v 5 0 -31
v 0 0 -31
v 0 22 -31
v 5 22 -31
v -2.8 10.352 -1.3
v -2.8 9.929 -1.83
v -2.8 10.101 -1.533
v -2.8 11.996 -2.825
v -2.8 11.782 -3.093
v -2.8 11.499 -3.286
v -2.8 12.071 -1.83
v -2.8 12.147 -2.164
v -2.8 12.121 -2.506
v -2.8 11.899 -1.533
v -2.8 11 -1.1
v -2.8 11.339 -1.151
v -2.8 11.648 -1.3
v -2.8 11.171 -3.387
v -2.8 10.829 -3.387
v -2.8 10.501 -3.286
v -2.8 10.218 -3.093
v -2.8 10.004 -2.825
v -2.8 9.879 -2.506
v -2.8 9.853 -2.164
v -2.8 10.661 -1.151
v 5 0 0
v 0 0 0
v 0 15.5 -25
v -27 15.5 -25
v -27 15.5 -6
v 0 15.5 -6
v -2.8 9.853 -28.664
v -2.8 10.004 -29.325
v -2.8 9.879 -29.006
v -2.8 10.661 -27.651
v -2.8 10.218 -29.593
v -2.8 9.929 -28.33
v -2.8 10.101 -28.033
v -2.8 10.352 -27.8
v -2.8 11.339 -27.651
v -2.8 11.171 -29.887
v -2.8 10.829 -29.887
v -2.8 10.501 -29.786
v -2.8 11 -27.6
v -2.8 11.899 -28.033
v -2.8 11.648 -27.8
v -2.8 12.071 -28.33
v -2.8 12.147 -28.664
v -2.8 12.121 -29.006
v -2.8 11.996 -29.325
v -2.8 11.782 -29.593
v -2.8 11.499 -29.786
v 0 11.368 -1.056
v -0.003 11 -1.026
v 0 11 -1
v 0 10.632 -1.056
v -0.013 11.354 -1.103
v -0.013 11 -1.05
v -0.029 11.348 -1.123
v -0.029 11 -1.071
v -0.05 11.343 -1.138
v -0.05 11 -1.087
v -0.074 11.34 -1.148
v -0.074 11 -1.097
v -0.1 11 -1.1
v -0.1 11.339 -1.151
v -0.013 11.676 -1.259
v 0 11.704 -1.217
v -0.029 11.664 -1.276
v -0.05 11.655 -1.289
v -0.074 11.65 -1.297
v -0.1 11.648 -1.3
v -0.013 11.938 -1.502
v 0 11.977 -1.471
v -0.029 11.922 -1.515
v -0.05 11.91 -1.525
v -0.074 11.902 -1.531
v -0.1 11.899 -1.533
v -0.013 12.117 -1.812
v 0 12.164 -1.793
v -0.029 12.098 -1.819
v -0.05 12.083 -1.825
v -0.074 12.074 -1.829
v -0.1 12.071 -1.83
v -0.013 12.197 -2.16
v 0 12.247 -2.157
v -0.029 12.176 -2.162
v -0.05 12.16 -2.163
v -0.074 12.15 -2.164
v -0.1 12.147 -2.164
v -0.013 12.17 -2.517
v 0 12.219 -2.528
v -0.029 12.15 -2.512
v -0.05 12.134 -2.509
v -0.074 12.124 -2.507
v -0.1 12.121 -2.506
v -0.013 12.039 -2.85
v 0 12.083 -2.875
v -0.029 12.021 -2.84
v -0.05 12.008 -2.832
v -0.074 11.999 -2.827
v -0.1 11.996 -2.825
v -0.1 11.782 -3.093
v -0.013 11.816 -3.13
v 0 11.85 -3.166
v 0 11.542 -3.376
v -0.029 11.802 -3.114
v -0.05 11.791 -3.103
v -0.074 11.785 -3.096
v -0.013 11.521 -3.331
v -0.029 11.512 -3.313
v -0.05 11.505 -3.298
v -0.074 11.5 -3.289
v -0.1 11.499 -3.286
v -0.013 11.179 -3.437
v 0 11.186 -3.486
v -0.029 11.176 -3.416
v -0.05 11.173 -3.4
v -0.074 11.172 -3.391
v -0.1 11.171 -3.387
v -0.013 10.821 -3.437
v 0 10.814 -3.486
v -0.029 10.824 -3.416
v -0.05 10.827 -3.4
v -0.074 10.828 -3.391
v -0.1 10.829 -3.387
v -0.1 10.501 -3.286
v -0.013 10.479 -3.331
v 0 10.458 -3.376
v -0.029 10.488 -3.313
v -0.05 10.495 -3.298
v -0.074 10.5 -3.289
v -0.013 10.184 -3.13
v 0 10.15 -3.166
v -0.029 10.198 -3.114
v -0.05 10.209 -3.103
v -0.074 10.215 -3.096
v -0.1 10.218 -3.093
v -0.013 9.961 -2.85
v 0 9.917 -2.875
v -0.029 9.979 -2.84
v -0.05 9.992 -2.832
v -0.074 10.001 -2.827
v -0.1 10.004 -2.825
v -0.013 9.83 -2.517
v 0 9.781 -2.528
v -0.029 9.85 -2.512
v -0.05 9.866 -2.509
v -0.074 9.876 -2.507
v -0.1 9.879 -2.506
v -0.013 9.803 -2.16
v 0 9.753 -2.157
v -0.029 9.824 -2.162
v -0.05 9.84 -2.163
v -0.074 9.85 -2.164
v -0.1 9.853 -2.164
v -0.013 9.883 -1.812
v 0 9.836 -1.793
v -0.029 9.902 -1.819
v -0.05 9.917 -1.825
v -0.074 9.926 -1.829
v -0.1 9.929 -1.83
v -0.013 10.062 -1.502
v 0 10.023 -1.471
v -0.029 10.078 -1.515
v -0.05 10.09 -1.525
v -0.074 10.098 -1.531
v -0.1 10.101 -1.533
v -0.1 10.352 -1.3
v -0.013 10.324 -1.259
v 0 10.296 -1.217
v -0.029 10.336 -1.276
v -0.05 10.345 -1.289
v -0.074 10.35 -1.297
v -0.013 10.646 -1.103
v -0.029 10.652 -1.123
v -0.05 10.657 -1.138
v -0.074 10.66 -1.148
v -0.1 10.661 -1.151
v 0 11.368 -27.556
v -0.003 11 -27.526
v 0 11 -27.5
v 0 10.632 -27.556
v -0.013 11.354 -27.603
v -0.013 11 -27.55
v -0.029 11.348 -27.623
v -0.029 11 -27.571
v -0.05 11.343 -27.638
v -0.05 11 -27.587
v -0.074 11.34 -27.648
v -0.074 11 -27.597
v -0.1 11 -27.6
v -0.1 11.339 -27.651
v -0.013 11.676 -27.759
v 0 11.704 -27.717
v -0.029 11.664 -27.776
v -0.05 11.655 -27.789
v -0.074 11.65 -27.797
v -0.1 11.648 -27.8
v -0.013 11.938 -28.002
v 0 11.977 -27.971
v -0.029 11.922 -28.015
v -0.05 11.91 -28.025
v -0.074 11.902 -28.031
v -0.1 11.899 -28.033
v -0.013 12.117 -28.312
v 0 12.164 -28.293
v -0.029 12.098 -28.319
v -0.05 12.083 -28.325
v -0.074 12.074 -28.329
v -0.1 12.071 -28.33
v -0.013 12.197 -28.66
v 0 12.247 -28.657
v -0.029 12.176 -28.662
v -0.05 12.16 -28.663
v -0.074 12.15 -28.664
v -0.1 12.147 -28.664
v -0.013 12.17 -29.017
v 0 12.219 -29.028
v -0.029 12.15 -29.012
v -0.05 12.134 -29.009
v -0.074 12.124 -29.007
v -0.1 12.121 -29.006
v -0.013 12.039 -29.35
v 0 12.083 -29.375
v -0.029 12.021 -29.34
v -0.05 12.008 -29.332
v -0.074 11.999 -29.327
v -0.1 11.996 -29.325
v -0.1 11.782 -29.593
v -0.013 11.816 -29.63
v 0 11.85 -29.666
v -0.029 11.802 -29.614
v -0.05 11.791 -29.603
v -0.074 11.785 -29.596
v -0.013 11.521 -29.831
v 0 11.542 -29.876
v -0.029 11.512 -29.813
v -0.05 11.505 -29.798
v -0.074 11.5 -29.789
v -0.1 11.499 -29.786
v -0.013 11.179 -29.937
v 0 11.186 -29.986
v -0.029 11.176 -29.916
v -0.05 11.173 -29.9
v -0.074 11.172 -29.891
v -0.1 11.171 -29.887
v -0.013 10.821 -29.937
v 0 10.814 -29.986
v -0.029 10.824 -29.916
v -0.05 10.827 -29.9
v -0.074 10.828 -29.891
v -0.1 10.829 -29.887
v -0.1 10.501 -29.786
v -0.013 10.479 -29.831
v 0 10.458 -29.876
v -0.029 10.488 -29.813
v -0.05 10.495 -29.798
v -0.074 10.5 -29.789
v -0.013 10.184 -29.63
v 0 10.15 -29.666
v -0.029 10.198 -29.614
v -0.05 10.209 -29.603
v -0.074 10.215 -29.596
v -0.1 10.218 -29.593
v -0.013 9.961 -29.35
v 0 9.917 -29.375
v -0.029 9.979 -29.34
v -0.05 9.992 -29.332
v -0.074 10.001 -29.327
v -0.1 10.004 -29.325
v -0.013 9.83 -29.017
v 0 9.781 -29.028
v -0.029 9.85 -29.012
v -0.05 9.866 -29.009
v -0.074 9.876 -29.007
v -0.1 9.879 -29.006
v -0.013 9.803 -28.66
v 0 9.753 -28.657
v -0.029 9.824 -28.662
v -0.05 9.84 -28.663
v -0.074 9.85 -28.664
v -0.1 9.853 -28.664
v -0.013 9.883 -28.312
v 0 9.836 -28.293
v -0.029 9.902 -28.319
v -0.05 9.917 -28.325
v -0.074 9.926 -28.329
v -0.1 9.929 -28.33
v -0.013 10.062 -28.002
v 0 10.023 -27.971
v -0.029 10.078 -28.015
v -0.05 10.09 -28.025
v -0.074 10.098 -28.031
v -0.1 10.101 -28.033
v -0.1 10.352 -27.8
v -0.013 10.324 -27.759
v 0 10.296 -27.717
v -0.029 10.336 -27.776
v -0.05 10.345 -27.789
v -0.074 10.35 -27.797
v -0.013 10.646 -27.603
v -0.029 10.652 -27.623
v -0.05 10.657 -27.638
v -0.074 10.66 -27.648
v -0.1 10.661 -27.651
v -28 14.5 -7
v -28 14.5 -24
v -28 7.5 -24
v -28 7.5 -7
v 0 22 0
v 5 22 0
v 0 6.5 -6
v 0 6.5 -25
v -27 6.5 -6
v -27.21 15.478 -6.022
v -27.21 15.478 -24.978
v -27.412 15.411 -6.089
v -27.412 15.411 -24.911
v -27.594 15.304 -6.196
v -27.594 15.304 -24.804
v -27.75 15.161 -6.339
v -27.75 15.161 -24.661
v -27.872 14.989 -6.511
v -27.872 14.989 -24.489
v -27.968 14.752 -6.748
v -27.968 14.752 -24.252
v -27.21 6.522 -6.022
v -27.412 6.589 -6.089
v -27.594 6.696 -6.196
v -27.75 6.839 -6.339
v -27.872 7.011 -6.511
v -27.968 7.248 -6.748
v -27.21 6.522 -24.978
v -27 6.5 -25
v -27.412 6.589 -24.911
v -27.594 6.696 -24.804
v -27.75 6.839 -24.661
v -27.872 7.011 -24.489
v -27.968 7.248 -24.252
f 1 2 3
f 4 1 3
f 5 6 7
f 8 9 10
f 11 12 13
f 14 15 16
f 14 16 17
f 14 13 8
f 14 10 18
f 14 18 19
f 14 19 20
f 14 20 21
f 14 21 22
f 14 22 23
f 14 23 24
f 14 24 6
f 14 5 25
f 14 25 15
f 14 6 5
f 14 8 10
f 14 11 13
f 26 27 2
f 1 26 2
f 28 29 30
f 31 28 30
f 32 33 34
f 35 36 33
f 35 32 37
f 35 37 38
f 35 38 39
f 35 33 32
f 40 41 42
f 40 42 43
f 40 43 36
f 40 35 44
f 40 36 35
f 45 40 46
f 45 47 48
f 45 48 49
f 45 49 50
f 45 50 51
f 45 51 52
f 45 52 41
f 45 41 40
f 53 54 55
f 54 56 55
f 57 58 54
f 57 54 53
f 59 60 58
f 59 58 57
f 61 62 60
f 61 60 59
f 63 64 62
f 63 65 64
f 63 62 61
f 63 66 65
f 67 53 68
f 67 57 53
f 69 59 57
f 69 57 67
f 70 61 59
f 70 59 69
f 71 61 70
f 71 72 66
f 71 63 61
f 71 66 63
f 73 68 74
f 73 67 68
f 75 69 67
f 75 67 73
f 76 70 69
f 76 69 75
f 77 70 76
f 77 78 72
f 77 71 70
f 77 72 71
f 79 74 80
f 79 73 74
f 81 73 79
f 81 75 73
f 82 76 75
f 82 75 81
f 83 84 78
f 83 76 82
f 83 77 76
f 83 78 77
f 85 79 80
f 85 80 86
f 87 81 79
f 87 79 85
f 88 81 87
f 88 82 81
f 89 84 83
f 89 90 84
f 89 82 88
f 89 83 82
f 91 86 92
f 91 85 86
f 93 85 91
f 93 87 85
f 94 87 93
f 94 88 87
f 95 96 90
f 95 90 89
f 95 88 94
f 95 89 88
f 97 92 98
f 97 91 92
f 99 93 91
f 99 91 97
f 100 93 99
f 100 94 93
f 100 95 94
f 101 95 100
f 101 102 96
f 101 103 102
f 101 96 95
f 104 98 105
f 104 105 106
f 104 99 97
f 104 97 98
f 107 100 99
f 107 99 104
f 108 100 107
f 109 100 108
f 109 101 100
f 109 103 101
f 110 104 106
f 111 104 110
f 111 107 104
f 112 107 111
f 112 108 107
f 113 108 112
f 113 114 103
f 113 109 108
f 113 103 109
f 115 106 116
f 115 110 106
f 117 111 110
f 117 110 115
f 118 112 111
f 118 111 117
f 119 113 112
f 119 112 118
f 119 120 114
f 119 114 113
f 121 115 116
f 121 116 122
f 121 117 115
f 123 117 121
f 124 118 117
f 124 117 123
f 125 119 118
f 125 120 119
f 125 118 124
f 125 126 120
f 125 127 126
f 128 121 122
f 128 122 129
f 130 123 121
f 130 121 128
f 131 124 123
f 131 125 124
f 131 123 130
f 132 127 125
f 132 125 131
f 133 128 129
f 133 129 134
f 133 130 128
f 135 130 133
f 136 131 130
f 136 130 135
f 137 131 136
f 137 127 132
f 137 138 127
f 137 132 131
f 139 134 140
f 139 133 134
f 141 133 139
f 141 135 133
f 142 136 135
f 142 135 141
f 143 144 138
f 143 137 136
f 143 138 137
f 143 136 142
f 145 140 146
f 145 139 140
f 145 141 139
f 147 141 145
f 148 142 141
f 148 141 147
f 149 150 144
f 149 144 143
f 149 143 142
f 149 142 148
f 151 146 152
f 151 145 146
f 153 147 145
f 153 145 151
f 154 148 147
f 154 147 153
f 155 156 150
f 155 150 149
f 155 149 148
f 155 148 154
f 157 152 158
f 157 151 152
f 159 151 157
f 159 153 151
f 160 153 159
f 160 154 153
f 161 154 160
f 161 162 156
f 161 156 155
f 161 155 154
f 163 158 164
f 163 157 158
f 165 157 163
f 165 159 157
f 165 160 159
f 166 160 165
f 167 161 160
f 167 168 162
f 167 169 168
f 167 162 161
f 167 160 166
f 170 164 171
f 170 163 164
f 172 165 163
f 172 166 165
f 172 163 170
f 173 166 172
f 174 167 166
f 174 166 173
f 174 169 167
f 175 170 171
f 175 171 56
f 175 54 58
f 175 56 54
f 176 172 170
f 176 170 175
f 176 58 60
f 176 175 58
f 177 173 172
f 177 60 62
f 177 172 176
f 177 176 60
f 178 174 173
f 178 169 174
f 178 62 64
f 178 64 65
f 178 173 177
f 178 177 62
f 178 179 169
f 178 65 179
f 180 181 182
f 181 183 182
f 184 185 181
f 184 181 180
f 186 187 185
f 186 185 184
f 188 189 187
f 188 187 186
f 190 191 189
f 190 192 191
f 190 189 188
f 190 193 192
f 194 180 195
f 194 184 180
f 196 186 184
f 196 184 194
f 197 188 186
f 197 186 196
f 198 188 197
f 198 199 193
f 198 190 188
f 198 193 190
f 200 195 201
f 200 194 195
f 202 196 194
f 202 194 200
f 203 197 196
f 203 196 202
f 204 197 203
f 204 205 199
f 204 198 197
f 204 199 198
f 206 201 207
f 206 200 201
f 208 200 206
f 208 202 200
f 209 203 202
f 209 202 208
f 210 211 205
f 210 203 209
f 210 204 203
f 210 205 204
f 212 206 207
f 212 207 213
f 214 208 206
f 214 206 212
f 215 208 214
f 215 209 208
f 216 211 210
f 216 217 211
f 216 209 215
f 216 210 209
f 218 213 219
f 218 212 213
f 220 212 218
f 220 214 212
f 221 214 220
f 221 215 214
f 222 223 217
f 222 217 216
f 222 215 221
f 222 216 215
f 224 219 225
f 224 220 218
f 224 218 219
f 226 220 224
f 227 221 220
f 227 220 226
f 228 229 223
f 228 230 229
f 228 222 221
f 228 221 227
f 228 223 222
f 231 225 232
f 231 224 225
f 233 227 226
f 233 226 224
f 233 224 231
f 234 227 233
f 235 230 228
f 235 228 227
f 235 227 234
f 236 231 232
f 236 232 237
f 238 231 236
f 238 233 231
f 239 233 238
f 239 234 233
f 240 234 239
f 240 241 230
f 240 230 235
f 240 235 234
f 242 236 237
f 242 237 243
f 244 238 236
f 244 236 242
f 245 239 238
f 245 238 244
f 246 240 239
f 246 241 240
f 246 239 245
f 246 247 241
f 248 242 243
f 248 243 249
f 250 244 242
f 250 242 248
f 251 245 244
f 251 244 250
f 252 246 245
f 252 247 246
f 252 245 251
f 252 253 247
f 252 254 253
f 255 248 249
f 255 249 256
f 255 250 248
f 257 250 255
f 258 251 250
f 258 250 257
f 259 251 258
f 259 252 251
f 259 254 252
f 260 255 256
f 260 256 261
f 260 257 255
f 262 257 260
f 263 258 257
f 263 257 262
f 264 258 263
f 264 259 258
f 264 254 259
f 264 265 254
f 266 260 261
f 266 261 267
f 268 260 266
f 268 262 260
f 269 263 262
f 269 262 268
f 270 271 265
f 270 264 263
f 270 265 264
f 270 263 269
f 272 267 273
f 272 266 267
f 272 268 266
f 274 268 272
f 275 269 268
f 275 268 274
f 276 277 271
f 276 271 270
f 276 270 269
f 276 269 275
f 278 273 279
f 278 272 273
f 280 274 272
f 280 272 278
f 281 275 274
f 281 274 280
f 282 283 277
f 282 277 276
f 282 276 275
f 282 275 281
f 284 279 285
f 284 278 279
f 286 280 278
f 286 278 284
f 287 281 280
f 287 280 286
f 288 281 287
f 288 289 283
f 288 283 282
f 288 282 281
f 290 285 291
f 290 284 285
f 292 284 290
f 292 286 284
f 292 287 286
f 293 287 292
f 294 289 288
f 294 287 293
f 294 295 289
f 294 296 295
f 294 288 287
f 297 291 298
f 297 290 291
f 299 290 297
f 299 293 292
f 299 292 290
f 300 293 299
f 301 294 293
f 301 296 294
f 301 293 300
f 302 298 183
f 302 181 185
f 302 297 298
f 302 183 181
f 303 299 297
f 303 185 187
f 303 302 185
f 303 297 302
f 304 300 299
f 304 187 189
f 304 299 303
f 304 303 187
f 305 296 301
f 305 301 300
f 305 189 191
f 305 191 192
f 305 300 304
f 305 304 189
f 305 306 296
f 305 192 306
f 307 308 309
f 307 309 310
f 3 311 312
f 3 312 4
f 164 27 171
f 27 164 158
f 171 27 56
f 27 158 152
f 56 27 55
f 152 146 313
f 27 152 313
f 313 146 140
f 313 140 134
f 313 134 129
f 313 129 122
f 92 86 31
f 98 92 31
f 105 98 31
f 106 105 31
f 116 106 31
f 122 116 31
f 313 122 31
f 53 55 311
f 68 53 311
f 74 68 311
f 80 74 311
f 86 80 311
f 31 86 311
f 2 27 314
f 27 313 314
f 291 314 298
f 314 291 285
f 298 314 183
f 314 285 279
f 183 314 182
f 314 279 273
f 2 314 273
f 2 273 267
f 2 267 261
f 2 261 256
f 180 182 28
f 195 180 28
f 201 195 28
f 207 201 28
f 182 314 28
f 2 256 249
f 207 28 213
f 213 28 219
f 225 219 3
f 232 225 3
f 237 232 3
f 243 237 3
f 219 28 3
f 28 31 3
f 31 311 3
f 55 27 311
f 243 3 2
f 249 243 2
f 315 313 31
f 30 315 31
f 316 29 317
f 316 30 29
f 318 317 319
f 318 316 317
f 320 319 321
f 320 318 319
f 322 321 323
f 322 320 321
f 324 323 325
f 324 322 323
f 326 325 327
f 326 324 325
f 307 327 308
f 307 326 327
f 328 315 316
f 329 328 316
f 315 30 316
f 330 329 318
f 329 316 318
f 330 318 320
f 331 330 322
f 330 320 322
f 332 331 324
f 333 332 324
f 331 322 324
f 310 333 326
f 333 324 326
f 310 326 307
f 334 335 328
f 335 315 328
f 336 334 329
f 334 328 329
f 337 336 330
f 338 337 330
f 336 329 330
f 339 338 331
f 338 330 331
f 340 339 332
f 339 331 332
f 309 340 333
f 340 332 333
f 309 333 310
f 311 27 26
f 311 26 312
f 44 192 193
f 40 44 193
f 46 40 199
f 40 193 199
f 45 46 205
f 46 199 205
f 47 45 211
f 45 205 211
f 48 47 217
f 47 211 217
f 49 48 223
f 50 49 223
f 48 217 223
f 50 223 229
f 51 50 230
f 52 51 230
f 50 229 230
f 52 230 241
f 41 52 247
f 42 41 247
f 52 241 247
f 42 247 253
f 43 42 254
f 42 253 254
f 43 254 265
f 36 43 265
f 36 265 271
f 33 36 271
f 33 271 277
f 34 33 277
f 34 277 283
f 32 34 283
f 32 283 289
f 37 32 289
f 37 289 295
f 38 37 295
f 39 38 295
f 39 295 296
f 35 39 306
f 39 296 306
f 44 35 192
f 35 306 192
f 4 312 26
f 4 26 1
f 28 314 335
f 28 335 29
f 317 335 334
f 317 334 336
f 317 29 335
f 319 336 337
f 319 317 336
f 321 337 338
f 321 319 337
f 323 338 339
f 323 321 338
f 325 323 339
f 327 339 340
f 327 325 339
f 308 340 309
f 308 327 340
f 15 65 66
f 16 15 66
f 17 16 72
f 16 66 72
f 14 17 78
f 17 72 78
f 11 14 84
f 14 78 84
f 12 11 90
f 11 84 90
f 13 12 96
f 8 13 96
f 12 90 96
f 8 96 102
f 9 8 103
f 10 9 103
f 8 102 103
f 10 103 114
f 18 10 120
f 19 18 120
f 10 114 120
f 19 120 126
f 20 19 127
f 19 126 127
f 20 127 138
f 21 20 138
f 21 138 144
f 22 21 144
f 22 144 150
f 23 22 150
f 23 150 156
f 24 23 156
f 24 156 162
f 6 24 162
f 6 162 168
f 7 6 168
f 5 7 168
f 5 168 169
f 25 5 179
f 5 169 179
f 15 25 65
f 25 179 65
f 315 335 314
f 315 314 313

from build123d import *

# Parameters (mm, degrees)
SKETCH1_W           = 31
SKETCH1_H           = 22
BOSS_EXTRUDE1_DEPTH = 5
SKETCH2_W           = 19
SKETCH2_H           = 9
BOSS_EXTRUDE2_DEPTH = 28
FILLET1_R           = 1
SKETCH3_R           = 1.15
BOSS_EXTRUDE3_DEPTH = 2.8
FILLET2_R           = 0.1
SKETCH4_R           = 1.15
BOSS_EXTRUDE4_DEPTH = 2.8
FILLET3_R           = 0.1


with BuildPart() as part:
    # Sketch1 → Boss-Extrude1 (new body)
    with BuildSketch(Plane(origin=(0, 0, 0), x_dir=(0, 0, -1), z_dir=(1, 0, 0))):
        with Locations((15.5, 11)):
            Rectangle(SKETCH1_W, SKETCH1_H)
    extrude(amount=BOSS_EXTRUDE1_DEPTH)

    # Sketch2 → Boss-Extrude2 (add)
    with BuildSketch(Plane.ZY):
        with Locations((-15.5, 11)):
            Rectangle(SKETCH2_W, SKETCH2_H)
    extrude(amount=BOSS_EXTRUDE2_DEPTH)

    # Fillet1
    fillet1_edges = [part.edges().sort_by_distance(p)[0] for p in [
        (-28, 11, -25),
        (-28, 6.5, -15.5),
        (-28, 11, -6),
        (-28, 15.5, -15.5),
    ]]
    fillet(fillet1_edges, radius=FILLET1_R)

    # Sketch3 → Boss-Extrude3 (add)
    with BuildSketch(Plane.ZY):
        with Locations((-2.25, 11)):
            Circle(SKETCH3_R)
    extrude(amount=BOSS_EXTRUDE3_DEPTH)

    # Fillet2
    fillet2_edges = [part.edges().sort_by_distance(p)[0] for p in [
        (0, 11, -3.4),
    ]]
    fillet(fillet2_edges, radius=FILLET2_R)

    # Sketch4 → Boss-Extrude4 (add)
    with BuildSketch(Plane.ZY):
        with Locations((-28.75, 11)):
            Circle(SKETCH4_R)
    extrude(amount=BOSS_EXTRUDE4_DEPTH)

    # Fillet3
    fillet3_edges = [part.edges().sort_by_distance(p)[0] for p in [
        (0, 11, -29.9),
    ]]
    fillet(fillet3_edges, radius=FILLET3_R)


solid = part.part
